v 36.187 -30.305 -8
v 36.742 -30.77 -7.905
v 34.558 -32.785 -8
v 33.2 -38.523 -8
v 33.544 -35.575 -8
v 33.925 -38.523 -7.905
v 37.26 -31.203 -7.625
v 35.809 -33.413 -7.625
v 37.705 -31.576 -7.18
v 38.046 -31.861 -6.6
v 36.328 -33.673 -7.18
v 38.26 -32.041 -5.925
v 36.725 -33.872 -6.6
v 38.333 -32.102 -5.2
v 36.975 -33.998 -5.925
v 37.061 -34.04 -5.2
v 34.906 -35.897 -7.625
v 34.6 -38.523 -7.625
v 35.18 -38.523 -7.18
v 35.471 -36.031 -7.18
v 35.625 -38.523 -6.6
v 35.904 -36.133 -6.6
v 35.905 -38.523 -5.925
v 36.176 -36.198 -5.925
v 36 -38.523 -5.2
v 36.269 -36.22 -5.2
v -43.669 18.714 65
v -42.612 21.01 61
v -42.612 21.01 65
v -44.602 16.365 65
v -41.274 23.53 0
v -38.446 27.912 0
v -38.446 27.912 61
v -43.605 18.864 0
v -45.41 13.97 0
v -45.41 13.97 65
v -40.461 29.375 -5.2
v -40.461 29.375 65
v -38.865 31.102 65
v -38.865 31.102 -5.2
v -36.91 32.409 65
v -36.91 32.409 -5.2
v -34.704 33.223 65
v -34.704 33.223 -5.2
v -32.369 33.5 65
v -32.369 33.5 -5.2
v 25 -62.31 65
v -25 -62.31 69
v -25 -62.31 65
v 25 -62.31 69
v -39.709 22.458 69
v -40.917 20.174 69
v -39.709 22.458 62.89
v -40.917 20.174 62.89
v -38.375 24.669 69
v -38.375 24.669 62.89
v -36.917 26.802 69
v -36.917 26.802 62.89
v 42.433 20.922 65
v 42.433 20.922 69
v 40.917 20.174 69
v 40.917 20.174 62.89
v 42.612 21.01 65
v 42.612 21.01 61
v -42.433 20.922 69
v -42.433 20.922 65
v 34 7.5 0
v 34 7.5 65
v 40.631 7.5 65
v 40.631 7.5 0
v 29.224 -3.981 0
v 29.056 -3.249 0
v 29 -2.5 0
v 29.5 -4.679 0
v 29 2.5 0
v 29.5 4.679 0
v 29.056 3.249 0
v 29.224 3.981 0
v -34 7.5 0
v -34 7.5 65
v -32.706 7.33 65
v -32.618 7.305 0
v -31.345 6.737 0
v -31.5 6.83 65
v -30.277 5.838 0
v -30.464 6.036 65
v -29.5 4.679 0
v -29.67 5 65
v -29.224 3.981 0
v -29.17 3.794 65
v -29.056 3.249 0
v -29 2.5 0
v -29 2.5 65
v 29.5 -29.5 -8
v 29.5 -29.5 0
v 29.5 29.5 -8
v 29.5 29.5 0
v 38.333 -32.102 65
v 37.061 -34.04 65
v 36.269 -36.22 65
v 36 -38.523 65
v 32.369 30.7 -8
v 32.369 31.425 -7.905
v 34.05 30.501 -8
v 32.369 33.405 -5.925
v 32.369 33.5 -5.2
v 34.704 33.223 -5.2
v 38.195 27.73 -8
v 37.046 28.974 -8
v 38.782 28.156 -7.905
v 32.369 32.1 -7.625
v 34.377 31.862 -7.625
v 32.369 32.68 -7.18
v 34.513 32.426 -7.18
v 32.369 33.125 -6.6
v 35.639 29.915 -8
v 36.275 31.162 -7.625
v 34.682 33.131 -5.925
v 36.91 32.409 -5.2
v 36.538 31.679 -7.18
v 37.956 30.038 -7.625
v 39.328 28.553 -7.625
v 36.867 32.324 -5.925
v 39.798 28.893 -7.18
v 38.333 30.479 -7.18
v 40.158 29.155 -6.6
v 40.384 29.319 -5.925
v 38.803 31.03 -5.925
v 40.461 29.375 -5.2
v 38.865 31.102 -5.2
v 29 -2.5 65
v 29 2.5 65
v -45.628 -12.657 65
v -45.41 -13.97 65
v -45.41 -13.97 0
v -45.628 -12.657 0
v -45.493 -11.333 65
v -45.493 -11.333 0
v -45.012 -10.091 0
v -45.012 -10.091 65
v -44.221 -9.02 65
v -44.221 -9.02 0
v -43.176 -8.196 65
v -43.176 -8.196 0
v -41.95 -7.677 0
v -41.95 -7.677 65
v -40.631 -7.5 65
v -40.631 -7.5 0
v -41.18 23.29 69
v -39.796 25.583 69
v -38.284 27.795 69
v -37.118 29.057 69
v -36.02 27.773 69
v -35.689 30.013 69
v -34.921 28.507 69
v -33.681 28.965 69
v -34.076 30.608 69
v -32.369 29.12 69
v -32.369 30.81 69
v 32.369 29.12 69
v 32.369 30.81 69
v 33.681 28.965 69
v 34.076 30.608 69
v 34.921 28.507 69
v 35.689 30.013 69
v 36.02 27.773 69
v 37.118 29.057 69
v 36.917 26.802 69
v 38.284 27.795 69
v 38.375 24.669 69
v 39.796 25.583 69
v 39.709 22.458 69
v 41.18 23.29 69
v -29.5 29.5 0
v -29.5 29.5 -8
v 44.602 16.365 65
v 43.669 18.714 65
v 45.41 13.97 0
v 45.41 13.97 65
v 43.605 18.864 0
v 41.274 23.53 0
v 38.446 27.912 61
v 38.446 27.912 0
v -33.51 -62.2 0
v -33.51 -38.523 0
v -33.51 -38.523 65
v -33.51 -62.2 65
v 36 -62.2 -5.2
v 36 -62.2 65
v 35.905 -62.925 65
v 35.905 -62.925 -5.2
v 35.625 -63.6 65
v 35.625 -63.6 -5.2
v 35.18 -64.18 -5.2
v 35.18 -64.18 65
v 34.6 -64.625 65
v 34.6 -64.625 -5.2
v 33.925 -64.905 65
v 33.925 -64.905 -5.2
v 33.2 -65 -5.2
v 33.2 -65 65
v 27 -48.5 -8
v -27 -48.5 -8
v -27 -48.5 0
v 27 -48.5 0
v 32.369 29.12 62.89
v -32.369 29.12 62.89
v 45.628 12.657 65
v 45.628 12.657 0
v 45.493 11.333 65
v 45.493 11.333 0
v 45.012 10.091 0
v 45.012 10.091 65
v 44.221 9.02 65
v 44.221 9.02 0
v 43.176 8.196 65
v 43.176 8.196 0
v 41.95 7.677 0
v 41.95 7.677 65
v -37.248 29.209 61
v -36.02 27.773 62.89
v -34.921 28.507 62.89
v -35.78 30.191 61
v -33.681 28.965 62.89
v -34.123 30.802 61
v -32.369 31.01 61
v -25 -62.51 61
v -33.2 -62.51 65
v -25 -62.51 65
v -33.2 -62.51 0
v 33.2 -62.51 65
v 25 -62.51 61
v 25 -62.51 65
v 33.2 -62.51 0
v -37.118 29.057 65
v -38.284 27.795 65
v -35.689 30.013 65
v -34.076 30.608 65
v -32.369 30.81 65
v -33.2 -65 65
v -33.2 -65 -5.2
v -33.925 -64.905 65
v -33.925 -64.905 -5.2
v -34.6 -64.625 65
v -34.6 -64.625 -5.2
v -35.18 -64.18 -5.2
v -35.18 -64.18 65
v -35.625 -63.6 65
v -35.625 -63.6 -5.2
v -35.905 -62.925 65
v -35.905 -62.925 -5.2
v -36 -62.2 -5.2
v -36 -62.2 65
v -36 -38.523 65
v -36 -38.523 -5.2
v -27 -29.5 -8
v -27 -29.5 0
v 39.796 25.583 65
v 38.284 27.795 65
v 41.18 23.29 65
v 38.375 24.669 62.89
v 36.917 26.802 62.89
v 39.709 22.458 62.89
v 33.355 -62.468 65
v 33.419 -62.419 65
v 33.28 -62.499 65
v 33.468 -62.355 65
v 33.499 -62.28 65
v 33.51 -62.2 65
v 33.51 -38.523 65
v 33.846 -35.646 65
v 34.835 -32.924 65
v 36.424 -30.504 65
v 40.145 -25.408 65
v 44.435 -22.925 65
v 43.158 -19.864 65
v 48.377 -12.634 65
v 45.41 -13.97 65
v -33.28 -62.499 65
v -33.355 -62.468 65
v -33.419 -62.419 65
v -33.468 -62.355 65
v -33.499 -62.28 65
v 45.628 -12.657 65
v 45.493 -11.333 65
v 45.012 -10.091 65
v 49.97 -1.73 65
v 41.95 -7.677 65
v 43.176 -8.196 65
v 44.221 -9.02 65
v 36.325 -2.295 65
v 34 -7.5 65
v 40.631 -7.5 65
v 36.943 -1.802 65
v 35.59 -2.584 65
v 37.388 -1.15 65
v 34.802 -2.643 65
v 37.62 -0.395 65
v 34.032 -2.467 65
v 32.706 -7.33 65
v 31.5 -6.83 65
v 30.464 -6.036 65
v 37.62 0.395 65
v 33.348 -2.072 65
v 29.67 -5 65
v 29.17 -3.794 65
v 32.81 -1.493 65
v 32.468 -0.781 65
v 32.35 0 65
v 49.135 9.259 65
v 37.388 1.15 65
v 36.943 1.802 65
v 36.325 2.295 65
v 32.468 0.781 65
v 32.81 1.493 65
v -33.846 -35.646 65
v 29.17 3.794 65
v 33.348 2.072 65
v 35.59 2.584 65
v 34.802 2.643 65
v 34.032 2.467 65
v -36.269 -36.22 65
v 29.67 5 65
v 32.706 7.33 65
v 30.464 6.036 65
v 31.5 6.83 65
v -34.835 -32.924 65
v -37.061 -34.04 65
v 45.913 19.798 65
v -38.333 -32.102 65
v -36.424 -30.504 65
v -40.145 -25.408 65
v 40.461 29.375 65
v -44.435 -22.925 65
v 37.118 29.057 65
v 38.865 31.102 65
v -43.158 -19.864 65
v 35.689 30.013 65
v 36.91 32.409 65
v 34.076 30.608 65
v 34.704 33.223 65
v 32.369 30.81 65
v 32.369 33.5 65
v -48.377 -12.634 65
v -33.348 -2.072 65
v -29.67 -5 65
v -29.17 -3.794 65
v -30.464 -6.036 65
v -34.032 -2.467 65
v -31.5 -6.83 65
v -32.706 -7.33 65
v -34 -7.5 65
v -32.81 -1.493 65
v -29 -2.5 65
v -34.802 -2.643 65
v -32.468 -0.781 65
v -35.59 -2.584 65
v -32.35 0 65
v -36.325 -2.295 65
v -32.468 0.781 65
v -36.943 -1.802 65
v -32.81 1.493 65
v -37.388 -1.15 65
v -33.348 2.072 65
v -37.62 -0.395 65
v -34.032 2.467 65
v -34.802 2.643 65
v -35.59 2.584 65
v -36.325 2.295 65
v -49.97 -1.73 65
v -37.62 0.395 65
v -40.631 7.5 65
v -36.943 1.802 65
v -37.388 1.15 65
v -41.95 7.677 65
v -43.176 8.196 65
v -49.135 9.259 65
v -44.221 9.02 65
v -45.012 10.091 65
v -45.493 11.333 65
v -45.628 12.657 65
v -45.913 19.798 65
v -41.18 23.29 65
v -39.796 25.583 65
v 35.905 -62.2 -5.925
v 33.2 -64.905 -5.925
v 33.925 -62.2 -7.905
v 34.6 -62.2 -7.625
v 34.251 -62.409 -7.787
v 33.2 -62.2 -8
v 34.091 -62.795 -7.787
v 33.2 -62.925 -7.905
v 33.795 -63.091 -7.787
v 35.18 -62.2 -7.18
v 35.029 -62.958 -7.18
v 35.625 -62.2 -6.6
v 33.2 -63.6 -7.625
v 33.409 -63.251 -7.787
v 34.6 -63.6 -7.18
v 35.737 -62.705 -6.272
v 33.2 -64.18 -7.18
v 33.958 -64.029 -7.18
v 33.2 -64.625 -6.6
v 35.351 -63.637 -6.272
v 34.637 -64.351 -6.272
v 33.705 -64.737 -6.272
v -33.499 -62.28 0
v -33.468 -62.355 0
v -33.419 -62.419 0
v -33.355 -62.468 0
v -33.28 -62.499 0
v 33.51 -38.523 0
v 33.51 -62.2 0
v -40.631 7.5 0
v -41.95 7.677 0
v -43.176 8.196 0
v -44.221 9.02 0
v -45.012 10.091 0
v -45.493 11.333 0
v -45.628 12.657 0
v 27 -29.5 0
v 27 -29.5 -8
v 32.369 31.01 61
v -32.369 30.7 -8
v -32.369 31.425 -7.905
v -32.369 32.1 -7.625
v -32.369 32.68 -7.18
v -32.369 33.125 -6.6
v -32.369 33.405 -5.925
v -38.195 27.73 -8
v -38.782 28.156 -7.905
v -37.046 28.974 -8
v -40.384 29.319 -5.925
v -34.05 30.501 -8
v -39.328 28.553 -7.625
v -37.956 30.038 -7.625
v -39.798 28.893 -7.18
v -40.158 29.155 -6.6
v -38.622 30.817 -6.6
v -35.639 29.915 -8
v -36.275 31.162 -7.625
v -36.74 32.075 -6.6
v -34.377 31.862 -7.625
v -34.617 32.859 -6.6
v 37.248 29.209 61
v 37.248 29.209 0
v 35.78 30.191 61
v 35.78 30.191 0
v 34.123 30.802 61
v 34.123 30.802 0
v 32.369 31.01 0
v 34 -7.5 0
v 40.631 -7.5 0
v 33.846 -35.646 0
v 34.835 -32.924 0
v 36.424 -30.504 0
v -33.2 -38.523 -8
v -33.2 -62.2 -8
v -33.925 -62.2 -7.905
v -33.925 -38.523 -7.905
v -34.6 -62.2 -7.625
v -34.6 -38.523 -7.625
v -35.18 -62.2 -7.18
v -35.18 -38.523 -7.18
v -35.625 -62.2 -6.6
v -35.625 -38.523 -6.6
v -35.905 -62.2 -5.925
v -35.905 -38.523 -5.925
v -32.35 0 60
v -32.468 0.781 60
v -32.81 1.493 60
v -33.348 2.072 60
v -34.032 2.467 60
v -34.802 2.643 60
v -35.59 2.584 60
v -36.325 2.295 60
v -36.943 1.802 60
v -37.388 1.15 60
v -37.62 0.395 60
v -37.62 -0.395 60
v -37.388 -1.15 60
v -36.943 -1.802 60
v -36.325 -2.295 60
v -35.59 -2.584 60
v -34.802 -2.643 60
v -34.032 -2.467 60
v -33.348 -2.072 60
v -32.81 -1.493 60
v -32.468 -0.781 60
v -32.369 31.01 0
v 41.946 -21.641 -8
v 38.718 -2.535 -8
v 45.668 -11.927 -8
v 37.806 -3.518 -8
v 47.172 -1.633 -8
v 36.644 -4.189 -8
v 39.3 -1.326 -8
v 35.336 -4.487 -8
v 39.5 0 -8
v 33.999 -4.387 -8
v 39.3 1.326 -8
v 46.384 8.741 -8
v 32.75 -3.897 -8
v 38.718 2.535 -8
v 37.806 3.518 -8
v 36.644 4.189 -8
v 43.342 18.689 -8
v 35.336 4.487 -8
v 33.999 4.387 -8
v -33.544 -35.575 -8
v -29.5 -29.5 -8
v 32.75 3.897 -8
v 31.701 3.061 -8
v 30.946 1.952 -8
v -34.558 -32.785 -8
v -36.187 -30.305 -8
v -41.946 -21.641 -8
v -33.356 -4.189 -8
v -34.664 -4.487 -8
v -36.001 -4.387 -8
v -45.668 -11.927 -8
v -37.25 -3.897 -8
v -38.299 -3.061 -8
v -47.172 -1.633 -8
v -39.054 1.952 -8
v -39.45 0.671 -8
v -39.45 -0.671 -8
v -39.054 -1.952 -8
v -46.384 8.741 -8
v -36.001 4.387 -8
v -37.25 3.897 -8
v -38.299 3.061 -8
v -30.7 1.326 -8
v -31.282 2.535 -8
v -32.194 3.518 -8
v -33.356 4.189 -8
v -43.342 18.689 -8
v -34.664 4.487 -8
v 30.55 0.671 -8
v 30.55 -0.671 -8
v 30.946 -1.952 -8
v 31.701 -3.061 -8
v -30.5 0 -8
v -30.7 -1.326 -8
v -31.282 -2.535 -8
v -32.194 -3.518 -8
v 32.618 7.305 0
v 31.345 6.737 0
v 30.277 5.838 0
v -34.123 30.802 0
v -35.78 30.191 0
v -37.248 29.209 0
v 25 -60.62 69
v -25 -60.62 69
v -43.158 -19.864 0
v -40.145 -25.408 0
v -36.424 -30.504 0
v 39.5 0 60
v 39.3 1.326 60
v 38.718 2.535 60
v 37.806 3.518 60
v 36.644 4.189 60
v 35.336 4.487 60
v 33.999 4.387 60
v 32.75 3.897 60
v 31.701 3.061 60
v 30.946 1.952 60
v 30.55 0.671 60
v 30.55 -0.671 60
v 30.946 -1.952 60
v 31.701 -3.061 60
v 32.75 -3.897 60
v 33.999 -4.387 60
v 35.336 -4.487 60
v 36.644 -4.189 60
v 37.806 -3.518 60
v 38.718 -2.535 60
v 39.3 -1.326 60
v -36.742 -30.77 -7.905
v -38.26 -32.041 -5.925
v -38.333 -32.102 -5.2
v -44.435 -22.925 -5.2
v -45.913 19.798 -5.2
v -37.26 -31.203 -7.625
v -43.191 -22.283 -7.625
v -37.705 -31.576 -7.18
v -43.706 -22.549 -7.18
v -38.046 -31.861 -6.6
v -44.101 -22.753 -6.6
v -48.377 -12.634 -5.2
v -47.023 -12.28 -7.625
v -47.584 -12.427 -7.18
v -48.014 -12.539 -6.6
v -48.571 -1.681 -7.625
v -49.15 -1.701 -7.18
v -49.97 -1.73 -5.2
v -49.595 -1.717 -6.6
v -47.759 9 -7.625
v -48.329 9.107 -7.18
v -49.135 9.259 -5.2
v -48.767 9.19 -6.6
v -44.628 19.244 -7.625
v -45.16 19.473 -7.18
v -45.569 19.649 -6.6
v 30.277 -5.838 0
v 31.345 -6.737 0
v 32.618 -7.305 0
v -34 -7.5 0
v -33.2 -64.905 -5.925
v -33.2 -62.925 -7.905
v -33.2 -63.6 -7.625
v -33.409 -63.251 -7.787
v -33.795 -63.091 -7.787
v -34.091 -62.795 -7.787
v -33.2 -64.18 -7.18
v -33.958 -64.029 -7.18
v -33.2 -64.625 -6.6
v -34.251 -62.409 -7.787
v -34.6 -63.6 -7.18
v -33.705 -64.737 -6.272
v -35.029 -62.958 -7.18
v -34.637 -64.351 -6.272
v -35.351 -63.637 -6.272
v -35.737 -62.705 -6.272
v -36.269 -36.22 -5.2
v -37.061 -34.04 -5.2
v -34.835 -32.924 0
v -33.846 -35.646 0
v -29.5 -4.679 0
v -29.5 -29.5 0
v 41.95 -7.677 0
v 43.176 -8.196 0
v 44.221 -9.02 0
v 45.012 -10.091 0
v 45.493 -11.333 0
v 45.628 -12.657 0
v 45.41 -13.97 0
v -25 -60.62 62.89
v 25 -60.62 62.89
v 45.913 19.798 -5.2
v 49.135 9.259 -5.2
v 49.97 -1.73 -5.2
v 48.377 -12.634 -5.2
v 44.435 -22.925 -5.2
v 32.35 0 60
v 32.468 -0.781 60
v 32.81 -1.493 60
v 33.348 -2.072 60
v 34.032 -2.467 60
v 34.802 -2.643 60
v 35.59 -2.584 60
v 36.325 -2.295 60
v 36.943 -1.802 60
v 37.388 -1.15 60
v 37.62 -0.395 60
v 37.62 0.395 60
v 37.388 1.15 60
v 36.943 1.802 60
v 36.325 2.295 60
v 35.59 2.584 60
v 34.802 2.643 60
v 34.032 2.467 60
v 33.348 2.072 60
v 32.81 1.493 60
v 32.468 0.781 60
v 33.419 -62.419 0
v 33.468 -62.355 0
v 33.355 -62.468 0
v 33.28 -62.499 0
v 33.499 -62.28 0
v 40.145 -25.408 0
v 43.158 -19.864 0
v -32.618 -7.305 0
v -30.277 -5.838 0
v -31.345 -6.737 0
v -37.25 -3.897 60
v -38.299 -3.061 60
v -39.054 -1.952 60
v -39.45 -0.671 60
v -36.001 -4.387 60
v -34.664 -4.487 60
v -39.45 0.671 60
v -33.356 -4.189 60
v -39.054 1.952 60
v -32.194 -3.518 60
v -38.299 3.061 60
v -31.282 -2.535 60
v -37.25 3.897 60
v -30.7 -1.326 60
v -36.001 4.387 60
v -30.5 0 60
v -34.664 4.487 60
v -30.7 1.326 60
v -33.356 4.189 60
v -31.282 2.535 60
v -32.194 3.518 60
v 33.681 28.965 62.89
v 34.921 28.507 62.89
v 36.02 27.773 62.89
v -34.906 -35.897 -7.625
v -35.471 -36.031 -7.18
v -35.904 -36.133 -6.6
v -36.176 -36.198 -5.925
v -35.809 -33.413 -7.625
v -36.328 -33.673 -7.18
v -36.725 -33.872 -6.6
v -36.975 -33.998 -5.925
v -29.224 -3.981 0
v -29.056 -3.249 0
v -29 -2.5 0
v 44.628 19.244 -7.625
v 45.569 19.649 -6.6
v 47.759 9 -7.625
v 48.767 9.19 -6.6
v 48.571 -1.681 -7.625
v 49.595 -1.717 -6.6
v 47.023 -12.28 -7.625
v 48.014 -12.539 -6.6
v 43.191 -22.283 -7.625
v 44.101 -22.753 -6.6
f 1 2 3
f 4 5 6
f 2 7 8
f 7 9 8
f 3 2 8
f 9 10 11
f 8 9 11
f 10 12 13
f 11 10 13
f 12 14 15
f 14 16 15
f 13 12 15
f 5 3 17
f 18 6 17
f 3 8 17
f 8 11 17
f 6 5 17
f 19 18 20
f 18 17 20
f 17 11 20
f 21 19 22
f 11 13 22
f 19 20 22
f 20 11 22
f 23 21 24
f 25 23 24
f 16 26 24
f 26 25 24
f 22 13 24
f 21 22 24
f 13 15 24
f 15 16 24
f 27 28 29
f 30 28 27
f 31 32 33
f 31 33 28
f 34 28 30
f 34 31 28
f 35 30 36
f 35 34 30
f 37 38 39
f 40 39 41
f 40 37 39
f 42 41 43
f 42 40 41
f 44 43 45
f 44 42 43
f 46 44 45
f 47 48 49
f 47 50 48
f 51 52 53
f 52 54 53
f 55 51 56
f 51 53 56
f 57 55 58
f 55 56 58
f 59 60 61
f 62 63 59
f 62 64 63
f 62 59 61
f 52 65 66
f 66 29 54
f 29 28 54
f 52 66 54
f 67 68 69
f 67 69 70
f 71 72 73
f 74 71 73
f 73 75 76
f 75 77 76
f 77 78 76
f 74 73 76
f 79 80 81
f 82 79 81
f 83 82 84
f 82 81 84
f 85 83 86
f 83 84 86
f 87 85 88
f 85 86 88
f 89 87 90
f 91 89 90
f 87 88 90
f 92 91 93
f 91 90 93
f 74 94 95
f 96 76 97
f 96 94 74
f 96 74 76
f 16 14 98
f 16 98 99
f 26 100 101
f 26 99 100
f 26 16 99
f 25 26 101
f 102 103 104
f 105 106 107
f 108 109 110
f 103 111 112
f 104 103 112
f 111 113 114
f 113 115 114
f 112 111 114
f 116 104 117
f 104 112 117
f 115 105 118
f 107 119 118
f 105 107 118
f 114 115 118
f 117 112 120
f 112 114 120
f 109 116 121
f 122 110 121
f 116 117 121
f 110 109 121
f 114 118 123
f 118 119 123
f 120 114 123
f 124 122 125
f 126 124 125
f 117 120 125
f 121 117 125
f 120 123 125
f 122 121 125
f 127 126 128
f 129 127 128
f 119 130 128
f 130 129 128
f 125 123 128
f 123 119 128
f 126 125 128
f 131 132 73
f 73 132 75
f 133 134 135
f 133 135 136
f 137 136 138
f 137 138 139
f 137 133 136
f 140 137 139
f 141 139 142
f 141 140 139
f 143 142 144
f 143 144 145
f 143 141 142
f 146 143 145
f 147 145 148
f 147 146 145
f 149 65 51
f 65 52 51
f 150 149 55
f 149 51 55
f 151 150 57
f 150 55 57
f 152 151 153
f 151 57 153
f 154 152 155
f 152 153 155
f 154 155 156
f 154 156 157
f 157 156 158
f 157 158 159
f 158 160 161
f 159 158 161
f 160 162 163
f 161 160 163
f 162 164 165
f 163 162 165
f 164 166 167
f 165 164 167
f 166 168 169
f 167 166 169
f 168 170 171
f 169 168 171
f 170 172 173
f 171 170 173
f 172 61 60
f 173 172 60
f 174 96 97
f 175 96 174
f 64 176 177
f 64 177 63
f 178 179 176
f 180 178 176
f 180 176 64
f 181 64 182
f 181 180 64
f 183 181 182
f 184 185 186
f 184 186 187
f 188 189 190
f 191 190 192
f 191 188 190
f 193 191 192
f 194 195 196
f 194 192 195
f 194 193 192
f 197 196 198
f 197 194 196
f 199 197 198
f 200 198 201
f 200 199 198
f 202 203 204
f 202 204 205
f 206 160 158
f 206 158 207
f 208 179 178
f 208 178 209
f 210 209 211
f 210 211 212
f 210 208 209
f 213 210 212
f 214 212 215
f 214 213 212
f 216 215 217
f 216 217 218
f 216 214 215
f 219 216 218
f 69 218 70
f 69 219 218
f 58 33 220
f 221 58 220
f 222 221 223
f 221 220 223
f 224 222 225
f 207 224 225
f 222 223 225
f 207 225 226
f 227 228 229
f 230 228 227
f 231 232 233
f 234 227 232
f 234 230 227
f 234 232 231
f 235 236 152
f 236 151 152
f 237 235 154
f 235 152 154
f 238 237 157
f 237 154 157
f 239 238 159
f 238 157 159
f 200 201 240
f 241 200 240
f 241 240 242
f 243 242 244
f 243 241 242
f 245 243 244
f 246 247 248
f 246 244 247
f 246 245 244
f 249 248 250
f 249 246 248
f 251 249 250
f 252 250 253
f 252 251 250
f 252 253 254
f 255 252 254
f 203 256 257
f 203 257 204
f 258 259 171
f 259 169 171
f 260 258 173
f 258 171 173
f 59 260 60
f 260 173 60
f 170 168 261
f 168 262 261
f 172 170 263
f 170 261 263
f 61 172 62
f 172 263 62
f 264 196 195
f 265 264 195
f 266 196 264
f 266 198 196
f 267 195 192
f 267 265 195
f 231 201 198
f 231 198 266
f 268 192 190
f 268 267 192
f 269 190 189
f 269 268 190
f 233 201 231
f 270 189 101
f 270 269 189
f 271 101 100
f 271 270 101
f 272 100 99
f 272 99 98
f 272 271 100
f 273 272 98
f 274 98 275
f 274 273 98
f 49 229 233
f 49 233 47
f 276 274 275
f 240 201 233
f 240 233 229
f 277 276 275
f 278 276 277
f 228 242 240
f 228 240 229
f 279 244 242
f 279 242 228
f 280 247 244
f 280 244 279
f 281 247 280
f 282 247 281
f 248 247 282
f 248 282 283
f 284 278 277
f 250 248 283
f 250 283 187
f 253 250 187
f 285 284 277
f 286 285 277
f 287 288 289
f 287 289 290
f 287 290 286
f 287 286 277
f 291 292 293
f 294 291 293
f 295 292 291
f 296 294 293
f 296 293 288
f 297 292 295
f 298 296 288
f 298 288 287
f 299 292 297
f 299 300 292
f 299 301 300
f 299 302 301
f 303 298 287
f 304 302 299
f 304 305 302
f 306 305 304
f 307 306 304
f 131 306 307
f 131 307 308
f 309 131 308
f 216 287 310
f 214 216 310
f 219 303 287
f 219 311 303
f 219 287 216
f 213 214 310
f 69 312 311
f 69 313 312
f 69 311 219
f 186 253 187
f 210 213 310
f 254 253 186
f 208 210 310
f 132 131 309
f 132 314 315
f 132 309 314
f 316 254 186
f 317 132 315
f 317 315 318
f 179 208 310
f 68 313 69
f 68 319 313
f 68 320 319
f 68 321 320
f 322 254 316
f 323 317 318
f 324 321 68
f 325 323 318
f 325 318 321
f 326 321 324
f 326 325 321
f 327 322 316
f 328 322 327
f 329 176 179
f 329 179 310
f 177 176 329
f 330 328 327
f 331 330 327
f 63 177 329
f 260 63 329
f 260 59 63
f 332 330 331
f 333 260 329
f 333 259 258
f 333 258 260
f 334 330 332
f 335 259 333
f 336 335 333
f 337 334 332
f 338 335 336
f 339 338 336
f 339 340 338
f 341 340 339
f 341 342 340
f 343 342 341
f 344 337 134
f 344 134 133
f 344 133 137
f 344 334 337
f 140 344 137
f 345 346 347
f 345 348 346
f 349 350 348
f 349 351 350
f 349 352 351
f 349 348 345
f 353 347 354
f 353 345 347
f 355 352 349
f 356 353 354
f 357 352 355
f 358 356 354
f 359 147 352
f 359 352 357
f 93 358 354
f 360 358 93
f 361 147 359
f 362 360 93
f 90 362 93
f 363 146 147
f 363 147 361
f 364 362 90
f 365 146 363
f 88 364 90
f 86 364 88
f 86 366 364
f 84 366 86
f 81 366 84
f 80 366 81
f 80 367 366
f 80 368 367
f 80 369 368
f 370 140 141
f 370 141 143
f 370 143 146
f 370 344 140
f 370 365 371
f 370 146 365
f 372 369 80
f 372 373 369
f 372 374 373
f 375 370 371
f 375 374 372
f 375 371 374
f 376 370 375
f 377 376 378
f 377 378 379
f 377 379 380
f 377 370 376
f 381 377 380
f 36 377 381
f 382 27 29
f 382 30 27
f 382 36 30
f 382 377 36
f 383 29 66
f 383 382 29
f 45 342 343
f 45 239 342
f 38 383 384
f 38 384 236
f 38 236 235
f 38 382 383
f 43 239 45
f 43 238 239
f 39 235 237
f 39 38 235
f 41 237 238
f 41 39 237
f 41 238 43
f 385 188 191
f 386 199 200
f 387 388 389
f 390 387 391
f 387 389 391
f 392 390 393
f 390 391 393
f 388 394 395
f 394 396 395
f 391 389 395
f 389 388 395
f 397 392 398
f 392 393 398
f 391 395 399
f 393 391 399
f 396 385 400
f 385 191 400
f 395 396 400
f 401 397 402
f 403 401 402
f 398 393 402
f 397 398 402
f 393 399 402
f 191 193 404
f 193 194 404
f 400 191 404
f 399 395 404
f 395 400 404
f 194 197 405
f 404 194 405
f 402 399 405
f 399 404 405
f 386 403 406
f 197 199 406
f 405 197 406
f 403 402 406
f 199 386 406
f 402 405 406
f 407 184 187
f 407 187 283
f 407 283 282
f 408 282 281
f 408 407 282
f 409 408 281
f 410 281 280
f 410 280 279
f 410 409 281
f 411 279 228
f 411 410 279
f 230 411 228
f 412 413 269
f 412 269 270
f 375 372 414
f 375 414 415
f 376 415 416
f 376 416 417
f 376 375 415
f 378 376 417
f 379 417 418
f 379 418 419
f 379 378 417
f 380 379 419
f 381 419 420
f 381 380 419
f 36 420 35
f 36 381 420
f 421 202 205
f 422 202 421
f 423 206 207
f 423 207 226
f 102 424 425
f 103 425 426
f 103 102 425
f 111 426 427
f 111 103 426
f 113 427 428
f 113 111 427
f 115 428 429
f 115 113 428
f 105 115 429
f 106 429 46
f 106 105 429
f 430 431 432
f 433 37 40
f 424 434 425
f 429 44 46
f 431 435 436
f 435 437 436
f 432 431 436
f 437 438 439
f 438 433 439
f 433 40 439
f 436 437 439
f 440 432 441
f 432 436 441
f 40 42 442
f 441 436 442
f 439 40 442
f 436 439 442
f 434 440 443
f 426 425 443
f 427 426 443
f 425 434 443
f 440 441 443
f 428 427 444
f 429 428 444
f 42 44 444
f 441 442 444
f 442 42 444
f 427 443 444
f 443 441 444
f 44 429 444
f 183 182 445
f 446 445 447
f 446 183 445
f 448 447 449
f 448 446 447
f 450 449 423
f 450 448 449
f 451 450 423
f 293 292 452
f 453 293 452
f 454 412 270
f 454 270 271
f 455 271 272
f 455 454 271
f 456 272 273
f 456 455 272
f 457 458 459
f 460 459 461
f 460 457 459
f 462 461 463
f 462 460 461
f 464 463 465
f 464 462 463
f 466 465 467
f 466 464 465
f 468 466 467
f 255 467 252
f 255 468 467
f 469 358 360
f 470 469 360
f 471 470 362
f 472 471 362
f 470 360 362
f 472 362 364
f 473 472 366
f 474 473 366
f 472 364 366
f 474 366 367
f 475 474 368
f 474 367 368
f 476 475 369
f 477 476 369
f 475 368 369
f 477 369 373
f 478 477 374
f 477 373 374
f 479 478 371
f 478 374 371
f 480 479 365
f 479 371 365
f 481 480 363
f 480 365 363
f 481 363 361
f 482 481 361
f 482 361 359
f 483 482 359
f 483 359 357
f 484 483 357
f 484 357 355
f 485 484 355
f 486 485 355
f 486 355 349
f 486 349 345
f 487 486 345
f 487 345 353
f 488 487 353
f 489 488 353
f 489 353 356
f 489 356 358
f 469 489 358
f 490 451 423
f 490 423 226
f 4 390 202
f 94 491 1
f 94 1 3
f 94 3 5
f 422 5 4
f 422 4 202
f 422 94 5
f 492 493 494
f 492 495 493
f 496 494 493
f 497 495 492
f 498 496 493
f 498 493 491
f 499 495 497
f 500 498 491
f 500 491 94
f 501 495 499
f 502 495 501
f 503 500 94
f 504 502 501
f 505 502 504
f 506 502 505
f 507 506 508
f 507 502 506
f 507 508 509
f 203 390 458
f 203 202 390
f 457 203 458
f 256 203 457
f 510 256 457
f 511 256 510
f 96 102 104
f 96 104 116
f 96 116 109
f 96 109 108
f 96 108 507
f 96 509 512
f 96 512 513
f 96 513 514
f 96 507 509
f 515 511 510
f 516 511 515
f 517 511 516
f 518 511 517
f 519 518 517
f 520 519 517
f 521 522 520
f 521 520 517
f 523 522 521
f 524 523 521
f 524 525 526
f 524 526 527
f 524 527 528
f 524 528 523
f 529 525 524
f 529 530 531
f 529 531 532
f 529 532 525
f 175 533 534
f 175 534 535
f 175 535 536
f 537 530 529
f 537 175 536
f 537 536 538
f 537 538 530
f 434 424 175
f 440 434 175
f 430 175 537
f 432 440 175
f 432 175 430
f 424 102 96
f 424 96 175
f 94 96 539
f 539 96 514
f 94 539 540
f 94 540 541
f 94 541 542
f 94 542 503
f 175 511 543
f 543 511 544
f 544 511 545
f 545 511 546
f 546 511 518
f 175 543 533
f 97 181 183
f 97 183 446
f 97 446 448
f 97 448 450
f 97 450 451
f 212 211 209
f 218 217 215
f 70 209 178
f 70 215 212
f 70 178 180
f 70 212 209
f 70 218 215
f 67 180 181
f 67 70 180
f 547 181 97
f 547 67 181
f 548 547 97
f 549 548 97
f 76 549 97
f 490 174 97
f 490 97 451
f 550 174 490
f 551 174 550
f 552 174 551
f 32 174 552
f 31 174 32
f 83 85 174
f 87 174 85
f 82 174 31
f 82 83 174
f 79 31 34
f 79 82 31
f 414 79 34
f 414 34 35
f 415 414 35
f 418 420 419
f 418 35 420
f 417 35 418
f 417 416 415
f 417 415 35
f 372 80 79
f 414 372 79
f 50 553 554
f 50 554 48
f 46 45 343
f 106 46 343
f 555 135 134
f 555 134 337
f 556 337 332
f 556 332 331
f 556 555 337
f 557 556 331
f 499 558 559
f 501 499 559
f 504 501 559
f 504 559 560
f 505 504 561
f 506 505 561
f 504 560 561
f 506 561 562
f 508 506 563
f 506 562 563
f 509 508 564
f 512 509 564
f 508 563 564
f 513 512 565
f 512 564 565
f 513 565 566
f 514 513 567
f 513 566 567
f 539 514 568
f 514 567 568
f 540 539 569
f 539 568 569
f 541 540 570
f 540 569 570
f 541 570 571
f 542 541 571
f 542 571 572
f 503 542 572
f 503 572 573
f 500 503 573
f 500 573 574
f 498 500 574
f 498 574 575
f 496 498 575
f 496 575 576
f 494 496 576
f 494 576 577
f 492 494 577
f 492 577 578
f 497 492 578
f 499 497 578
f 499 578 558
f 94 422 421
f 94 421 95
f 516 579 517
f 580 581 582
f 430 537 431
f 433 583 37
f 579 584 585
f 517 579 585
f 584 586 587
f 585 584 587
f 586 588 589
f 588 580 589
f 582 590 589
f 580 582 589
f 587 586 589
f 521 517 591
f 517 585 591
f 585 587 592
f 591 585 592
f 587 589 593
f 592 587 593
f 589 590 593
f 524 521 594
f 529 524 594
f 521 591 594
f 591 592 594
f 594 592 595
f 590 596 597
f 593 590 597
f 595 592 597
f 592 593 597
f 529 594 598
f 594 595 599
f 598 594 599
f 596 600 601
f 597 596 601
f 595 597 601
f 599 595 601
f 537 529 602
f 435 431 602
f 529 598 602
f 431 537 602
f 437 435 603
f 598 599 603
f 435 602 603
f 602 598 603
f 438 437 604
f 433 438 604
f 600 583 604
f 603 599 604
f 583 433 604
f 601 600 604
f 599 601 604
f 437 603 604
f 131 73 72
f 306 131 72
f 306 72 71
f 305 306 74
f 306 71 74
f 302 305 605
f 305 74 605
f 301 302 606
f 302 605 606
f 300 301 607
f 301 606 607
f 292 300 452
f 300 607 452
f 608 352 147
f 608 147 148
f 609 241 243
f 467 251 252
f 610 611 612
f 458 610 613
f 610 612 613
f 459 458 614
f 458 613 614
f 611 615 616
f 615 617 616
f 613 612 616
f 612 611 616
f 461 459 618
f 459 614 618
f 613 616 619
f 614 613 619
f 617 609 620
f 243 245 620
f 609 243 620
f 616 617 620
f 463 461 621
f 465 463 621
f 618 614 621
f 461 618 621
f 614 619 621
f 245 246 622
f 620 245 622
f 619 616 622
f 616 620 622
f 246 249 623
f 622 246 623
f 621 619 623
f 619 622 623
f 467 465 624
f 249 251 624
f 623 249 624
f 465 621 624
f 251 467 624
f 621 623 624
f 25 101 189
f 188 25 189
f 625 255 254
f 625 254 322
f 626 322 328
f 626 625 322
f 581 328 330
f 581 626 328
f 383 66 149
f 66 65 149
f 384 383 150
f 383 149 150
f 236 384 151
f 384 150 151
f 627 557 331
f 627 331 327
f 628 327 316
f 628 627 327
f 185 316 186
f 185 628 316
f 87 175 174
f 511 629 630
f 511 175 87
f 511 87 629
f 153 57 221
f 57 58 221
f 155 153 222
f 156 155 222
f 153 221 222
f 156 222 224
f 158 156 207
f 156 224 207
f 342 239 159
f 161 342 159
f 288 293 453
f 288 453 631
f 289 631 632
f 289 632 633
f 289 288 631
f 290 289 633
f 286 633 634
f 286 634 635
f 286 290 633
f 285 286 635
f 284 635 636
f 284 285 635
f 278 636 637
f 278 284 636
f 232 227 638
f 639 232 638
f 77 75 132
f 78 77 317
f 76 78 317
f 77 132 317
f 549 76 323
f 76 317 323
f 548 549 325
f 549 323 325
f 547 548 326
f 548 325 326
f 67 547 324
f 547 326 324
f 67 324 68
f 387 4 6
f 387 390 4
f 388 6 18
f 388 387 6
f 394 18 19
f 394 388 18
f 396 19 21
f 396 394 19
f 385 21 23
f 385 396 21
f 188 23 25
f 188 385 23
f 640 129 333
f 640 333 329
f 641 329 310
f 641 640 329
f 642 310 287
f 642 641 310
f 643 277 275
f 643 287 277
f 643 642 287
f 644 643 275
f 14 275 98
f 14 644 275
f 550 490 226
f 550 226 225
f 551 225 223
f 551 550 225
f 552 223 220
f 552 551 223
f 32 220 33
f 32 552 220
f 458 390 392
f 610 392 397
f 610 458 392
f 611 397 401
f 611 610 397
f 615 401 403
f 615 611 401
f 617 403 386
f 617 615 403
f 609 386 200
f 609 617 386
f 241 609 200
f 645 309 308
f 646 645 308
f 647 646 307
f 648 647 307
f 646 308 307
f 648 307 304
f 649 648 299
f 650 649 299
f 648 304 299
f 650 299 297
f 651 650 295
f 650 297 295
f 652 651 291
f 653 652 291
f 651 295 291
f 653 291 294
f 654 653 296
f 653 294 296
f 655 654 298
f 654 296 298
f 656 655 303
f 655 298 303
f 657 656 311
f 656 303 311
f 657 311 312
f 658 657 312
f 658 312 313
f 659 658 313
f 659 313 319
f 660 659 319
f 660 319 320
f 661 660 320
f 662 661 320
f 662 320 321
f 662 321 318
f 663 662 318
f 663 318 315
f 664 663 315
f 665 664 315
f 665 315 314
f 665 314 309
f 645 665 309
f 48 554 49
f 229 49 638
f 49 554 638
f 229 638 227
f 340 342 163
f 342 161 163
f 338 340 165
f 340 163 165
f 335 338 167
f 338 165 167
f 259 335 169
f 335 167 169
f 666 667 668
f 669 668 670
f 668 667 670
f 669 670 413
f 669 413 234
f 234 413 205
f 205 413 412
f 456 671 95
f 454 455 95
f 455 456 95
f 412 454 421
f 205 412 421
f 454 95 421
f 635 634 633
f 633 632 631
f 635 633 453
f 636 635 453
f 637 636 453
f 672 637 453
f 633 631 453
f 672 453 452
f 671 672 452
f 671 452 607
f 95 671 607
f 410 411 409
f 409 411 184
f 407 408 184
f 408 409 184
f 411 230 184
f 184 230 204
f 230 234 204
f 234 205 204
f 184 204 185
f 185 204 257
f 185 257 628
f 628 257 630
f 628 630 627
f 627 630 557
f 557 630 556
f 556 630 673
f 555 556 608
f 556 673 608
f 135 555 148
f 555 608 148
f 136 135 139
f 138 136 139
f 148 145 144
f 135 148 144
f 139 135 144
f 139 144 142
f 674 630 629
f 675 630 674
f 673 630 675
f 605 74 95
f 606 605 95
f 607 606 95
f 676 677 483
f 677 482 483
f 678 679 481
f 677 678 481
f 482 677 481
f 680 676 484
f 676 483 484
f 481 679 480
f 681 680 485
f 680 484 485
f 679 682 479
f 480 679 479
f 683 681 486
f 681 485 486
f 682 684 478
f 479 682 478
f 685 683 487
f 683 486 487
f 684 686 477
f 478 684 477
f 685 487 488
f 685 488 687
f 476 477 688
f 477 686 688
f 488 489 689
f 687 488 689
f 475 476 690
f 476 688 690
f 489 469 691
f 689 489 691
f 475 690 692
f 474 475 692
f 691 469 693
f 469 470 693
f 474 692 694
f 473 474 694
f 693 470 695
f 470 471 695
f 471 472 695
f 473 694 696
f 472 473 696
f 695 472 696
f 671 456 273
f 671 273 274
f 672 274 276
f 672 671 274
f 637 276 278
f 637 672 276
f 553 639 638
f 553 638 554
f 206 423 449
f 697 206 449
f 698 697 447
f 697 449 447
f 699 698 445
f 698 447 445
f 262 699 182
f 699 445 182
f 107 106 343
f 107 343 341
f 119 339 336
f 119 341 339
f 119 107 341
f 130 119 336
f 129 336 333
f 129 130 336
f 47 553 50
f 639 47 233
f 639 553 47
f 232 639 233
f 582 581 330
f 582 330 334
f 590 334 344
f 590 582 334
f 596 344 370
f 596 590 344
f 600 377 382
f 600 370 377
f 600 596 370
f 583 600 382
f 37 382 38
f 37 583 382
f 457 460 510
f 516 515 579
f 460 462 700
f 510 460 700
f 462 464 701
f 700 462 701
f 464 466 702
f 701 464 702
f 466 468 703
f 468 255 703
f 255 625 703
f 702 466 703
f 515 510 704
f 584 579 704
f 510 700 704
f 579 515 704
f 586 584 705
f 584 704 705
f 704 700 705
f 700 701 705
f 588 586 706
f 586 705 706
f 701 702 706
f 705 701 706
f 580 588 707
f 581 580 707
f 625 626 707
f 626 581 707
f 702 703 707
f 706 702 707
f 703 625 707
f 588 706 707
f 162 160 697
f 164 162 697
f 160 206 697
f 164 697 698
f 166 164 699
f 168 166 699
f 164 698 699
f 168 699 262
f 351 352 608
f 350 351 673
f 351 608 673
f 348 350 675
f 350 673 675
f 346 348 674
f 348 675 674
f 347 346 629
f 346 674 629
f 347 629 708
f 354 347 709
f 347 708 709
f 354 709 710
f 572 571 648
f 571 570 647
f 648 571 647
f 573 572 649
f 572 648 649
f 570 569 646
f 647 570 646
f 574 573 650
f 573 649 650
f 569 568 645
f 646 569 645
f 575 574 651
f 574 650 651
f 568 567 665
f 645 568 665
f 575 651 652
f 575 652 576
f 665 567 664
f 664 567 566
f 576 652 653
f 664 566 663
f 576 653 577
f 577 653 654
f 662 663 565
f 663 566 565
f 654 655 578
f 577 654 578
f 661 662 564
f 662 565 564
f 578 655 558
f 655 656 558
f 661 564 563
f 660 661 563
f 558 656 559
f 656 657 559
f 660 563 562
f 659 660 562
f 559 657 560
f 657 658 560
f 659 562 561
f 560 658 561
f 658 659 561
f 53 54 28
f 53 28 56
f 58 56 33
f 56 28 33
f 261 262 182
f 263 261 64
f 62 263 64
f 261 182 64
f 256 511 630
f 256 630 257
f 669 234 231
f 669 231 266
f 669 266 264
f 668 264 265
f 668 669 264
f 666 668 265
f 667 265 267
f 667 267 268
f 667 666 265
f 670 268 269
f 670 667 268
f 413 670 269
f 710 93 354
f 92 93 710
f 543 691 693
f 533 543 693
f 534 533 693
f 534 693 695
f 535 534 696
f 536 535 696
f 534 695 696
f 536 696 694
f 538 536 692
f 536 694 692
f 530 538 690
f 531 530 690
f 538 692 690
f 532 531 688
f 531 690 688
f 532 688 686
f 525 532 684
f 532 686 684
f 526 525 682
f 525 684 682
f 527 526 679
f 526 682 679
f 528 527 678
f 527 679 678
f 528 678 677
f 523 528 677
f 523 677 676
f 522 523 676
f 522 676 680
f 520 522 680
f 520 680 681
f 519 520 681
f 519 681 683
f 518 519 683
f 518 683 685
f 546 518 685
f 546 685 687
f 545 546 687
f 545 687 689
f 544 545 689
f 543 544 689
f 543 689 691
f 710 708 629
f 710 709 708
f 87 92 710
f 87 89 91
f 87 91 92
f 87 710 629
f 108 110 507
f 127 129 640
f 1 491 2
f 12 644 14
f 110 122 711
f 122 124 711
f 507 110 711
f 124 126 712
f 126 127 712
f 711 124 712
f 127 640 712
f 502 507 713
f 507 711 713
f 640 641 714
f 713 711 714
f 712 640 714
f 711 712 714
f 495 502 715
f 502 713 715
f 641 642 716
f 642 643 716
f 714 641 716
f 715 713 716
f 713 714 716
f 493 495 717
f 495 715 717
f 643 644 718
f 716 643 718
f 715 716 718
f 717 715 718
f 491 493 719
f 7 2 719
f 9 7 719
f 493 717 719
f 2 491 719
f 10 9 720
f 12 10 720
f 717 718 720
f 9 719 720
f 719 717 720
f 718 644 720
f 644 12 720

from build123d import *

# Parameters (mm, degrees)
LINEAR_AUSTRAGEN_D_NN1_DEPTH         = 65
AUFSATZ_LINEAR_START                 = 8
AUFSATZ_LINEAR_AUSTRAGEN2_DEPTH      = 8
AUFSATZ_LINEAR_AUSTRAGEN3_REACH      = 135.642
AUFSATZ_LINEAR_AUSTRAGEN3_END_RADIUS = 47.51
AUFSATZ_LINEAR_START_2               = 29
SKIZZE6_W                            = 65
SKIZZE6_H                            = 15
AUFSATZ_LINEAR_AUSTRAGEN4_REACH      = 135.642
AUFSATZ_LINEAR_START_3               = -29
SKIZZE6_2_W                          = 65
SKIZZE6_2_H                          = 15
SCHNITT_LINEAR_AUSTRAGEN2_REACH      = 111.791
SKIZZE7_R                            = 2.65
SCHNITT_LINEAR_AUSTRAGEN3_REACH      = 116.791
SCHNITT_LINEAR_START                 = -5
SKIZZE8_R                            = 4.5
AUFSATZ_LINEAR_AUSTRAGEN6_DEPTH      = 25
VERRUNDUNG1_R                        = 5
VERRUNDUNG3_R                        = 2.8


with BuildPart() as part:
    # Skizze1 → Linear-Austragen-Dünn1 (new body)
    with BuildSketch(Plane.XY):
        with BuildLine():
            Line((-33.2, -65), (0, -65))
            Line((0, -65), (33.2, -65))
            ThreePointArc((33.2, -65), (35.179898987, -64.179898987), (36, -62.2))
            Line((36, -62.2), (36, -38.522720569))
            ThreePointArc((36, -38.522720569), (36.601418547, -35.107070313), (38.333333333, -32.10226714))
            ThreePointArc((38.333333333, -32.10226714), (49.970076451, -1.729583607), (40.461208274, 29.375))
            ThreePointArc((40.461208274, 29.375), (36.91044215, 32.409264841), (32.368966619, 33.5))
            Line((32.368966619, 33.5), (0, 33.5))
            Line((0, 33.5), (-32.368966619, 33.5))
            ThreePointArc((-32.368966619, 33.5), (-36.91044215, 32.409264841), (-40.461208274, 29.375))
            ThreePointArc((-40.461208274, 29.375), (-49.970076451, -1.729583607), (-38.333333333, -32.10226714))
            ThreePointArc((-38.333333333, -32.10226714), (-36.601418547, -35.107070313), (-36, -38.522720569))
            Line((-36, -38.522720569), (-36, -62.2))
            ThreePointArc((-36, -62.2), (-35.179898987, -64.179898987), (-33.2, -65))
        make_face()
        with BuildLine():
            Line((-33.2, -62.51), (0, -62.51))
            Line((0, -62.51), (33.2, -62.51))
            ThreePointArc((33.2, -62.51), (33.419203102, -62.419203102), (33.51, -62.2))
            Line((33.51, -62.2), (33.51, -38.522720569))
            ThreePointArc((33.51, -38.522720569), (34.261171765, -34.2565734), (36.424333333, -30.503574237))
            ThreePointArc((36.424333333, -30.503574237), (47.481566644, -1.643450344), (38.446240102, 27.912125))
            ThreePointArc((38.446240102, 27.912125), (35.779614743, 30.190857895), (32.368966619, 31.01))
            Line((32.368966619, 31.01), (0, 31.01))
            Line((0, 31.01), (-32.368966619, 31.01))
            ThreePointArc((-32.368966619, 31.01), (-35.779614743, 30.190857895), (-38.446240102, 27.912125))
            ThreePointArc((-38.446240102, 27.912125), (-47.481566644, -1.643450344), (-36.424333333, -30.503574237))
            ThreePointArc((-36.424333333, -30.503574237), (-34.261171765, -34.2565734), (-33.51, -38.522720569))
            Line((-33.51, -38.522720569), (-33.51, -62.2))
            ThreePointArc((-33.51, -62.2), (-33.419203102, -62.419203102), (-33.2, -62.51))
        make_face(mode=Mode.SUBTRACT)
    extrude(amount=LINEAR_AUSTRAGEN_D_NN1_DEPTH)

    # Skizze3 → Aufsatz-Linear austragen2 (add)
    # profile 1 of 2: a face of its own
    with BuildSketch(Plane(origin=(0, 0, 0), x_dir=(-1, 0, 0), z_dir=(0, 0, -1)).offset(AUFSATZ_LINEAR_START)):
        with BuildLine():
            ThreePointArc((40.461208274, 29.375), (36.91044215, 32.409264841), (32.368966619, 33.5))
            Line((32.368966619, 33.5), (-32.368966619, 33.5))
            ThreePointArc((-32.368966619, 33.5), (-36.91044215, 32.409264841), (-40.461208274, 29.375))
            ThreePointArc((-40.461208274, 29.375), (-49.970076451, -1.729583607), (-38.333333333, -32.10226714))
            ThreePointArc((-38.333333333, -32.10226714), (-36.601418547, -35.107070313), (-36, -38.522720569))
            Line((-36, -38.522720569), (-36, -62.2))
            ThreePointArc((-36, -62.2), (-35.179898987, -64.179898987), (-33.2, -65))
            Line((-33.2, -65), (33.2, -65))
            ThreePointArc((33.2, -65), (35.179898987, -64.179898987), (36, -62.2))
            Line((36, -62.2), (36, -38.522720569))
            ThreePointArc((36, -38.522720569), (36.601418547, -35.107070313), (38.333333333, -32.10226714))
            ThreePointArc((38.333333333, -32.10226714), (49.970076451, -1.729583607), (40.461208274, 29.375))
        make_face()
        with BuildLine():
            ThreePointArc((-38.446240102, 27.912125), (-35.779614743, 30.190857895), (-32.368966619, 31.01))
            Line((-32.368966619, 31.01), (32.368966619, 31.01))
            ThreePointArc((32.368966619, 31.01), (35.779614743, 30.190857895), (38.446240102, 27.912125))
            ThreePointArc((38.446240102, 27.912125), (47.481566644, -1.643450344), (36.424333333, -30.503574237))
            ThreePointArc((36.424333333, -30.503574237), (34.261171765, -34.2565734), (33.51, -38.522720569))
            Line((33.51, -38.522720569), (33.51, -62.2))
            ThreePointArc((33.51, -62.2), (33.419203102, -62.419203102), (33.2, -62.51))
            Line((33.2, -62.51), (-33.2, -62.51))
            ThreePointArc((-33.2, -62.51), (-33.419203102, -62.419203102), (-33.51, -62.2))
            Line((-33.51, -62.2), (-33.51, -38.522720569))
            ThreePointArc((-33.51, -38.522720569), (-34.261171765, -34.2565734), (-36.424333333, -30.503574237))
            ThreePointArc((-36.424333333, -30.503574237), (-47.481566644, -1.643450344), (-38.446240102, 27.912125))
        make_face(mode=Mode.SUBTRACT)
    # profile 2 of 2: a face of its own
    with BuildSketch(Plane(origin=(0, 0, 0), x_dir=(-1, 0, 0), z_dir=(0, 0, -1)).offset(AUFSATZ_LINEAR_START)):
        with BuildLine():
            Line((32.368966619, 31.01), (-32.368966619, 31.01))
            ThreePointArc((-32.368966619, 31.01), (-35.779614743, 30.190857895), (-38.446240102, 27.912125))
            ThreePointArc((-38.446240102, 27.912125), (-47.481566644, -1.643450344), (-36.424333333, -30.503574237))
            ThreePointArc((-36.424333333, -30.503574237), (-34.261171765, -34.2565734), (-33.51, -38.522720569))
            Line((-33.51, -38.522720569), (-33.51, -62.2))
            ThreePointArc((-33.51, -62.2), (-33.419203102, -62.419203102), (-33.2, -62.51))
            Line((-33.2, -62.51), (33.2, -62.51))
            ThreePointArc((33.2, -62.51), (33.419203102, -62.419203102), (33.51, -62.2))
            Line((33.51, -62.2), (33.51, -38.522720569))
            ThreePointArc((33.51, -38.522720569), (34.261171765, -34.2565734), (36.424333333, -30.503574237))
            ThreePointArc((36.424333333, -30.503574237), (47.481566644, -1.643450344), (38.446240102, 27.912125))
            ThreePointArc((38.446240102, 27.912125), (35.779614743, 30.190857895), (32.368966619, 31.01))
        make_face()
        Polygon((-27, -29.5), (-29.5, -29.5), (-29.5, 29.5), (29.5, 29.5), (29.5, -29.5), (27, -29.5), (27, -48.5), (-27, -48.5), align=None, mode=Mode.SUBTRACT)
    extrude(amount=-AUFSATZ_LINEAR_AUSTRAGEN2_DEPTH)

    # Aufsatz-Linear austragen3: up to this cylinder (the profile starts inside it)
    aufsatz_linear_austragen3_end = Plane(origin=(0, 0, 32.5), z_dir=(0, 0, -1)) * Cylinder(AUFSATZ_LINEAR_AUSTRAGEN3_END_RADIUS, 367.304, mode=Mode.PRIVATE)
    # Skizze6 → Aufsatz-Linear austragen3 (add, up to the surface)
    with BuildSketch(Plane(origin=(0, 0, 0), x_dir=(0, 0, -1), z_dir=(1, 0, 0)).offset(AUFSATZ_LINEAR_START_2), mode=Mode.PRIVATE) as aufsatz_linear_austragen3_sk1:
        with Locations((-32.5, 0)):
            Rectangle(SKIZZE6_W, SKIZZE6_H)
    aufsatz_linear_austragen3_tool1 = extrude(aufsatz_linear_austragen3_sk1.sketch, amount=AUFSATZ_LINEAR_AUSTRAGEN3_REACH, mode=Mode.PRIVATE) & aufsatz_linear_austragen3_end
    add(aufsatz_linear_austragen3_tool1.solids().sort_by_distance((29, 0, 32.5))[0])

    # Skizze6<2> → Aufsatz-Linear austragen4 (add, up to next)
    with BuildSketch(Plane(origin=(0, 0, 0), x_dir=(0, 0, -1), z_dir=(1, 0, 0)).offset(AUFSATZ_LINEAR_START_3), mode=Mode.PRIVATE) as aufsatz_linear_austragen4_sk1:
        with Locations((-32.5, 0)):
            Rectangle(SKIZZE6_2_W, SKIZZE6_2_H)
    aufsatz_linear_austragen4_tool1 = extrude(aufsatz_linear_austragen4_sk1.sketch, amount=-AUFSATZ_LINEAR_AUSTRAGEN4_REACH, mode=Mode.PRIVATE) - part.part
    add(aufsatz_linear_austragen4_tool1.solids().sort_by_distance((-29, 0, 32.5))[0])

    # Skizze7 → Schnitt-Linear austragen2 (cut, up to next)
    with BuildSketch(Plane.XY.offset(65), mode=Mode.PRIVATE) as schnitt_linear_austragen2_sk1:
        with Locations((-35, 0)):
            Circle(SKIZZE7_R)
    schnitt_linear_austragen2_tool1 = extrude(schnitt_linear_austragen2_sk1.sketch, amount=-SCHNITT_LINEAR_AUSTRAGEN2_REACH, mode=Mode.PRIVATE) & part.part
    # Skizze7 → Schnitt-Linear austragen2 (cut, up to next)
    with BuildSketch(Plane.XY.offset(65), mode=Mode.PRIVATE) as schnitt_linear_austragen2_sk2:
        with Locations(Location((35, 0, 0), (0, 0, 180))):
            Circle(SKIZZE7_R)
    schnitt_linear_austragen2_tool2 = extrude(schnitt_linear_austragen2_sk2.sketch, amount=-SCHNITT_LINEAR_AUSTRAGEN2_REACH, mode=Mode.PRIVATE) & part.part
    add(schnitt_linear_austragen2_tool1.solids().sort_by_distance((-35, 0, 65))[0], mode=Mode.SUBTRACT)
    add(schnitt_linear_austragen2_tool2.solids().sort_by_distance((35, 0, 65))[0], mode=Mode.SUBTRACT)

    # Skizze8 → Schnitt-Linear austragen3 (cut, up to next)
    with BuildSketch(Plane.XY.offset(65).offset(SCHNITT_LINEAR_START), mode=Mode.PRIVATE) as schnitt_linear_austragen3_sk1:
        with Locations((-35, 0)):
            Circle(SKIZZE8_R)
    schnitt_linear_austragen3_tool1 = extrude(schnitt_linear_austragen3_sk1.sketch, amount=-SCHNITT_LINEAR_AUSTRAGEN3_REACH, mode=Mode.PRIVATE) & part.part
    # Skizze8 → Schnitt-Linear austragen3 (cut, up to next)
    with BuildSketch(Plane.XY.offset(65).offset(SCHNITT_LINEAR_START), mode=Mode.PRIVATE) as schnitt_linear_austragen3_sk2:
        with Locations((35, 0)):
            Circle(SKIZZE8_R)
    schnitt_linear_austragen3_tool2 = extrude(schnitt_linear_austragen3_sk2.sketch, amount=-SCHNITT_LINEAR_AUSTRAGEN3_REACH, mode=Mode.PRIVATE) & part.part
    add(schnitt_linear_austragen3_tool1.solids().sort_by_distance((-35, 0, 60))[0], mode=Mode.SUBTRACT)
    add(schnitt_linear_austragen3_tool2.solids().sort_by_distance((35, 0, 60))[0], mode=Mode.SUBTRACT)

    # Austragung12: sweep along a path in Skizze10
    with BuildLine(Plane.XY.offset(65)) as austragung12_path:
        ThreePointArc((-42.611970149, 21.01), (-40.675769134, 24.549580553), (-38.446240102, 27.912125))
        ThreePointArc((-38.446240102, 27.912125), (-35.779614743, 30.190857895), (-32.368966619, 31.01))
        Line((-32.368966619, 31.01), (32.368966619, 31.01))
        ThreePointArc((32.368966619, 31.01), (35.779614743, 30.190857895), (38.446240102, 27.912125))
        ThreePointArc((38.446240102, 27.912125), (40.675769134, 24.549580553), (42.611970149, 21.01))
    # Skizze9 → Austragung12 (sweep)
    with BuildSketch(Plane(origin=(0, 0, 0), x_dir=(0, 0, -1), z_dir=(1, 0, 0))):
        Polygon((-65, 31.01), (-65, 30.81), (-69, 30.81), (-69, 29.12), (-62.89, 29.12), (-60, 32.01), (-65, 32.01), align=None)
    sweep(path=austragung12_path.line)

    # Skizze9<4> → Aufsatz-Linear austragen6 (add, symmetric)
    with BuildSketch(Plane(origin=(0, 0, 0), x_dir=(0, 0, -1), z_dir=(1, 0, 0))):
        Polygon((-65, -63.51), (-60, -63.51), (-62.89, -60.62), (-69, -60.62), (-69, -62.31), (-65, -62.31), (-65, -62.51), align=None)
    extrude(amount=AUFSATZ_LINEAR_AUSTRAGEN6_DEPTH, both=True)

    # Verrundung1
    # the kernel refuses this fillet: 5 mm, written as the material it adds along each edge
    with BuildSketch(Plane(origin=(46.914284605, 7.5, 65), x_dir=(-1, 0, 0), z_dir=(0, 0, -1)), Plane(origin=(-46.914284605, -7.5, 65), x_dir=(1, 0, 0), z_dir=(0, 0, -1))) as verrundung1_piece_1:
        with BuildLine():
            CenterArc((6.283629922, 5), VERRUNDUNG1_R, 162.899512403, 107.100487597)
            ThreePointArc((1.504677359, 6.470242296), (0.639115665, 3.261451554), (0, 0))
            Line((0, 0), (6.283629922, 0))
        make_face()
    extrude(amount=65)
    with BuildSketch(Plane(origin=(46.914284605, -7.5, 65), x_dir=(-0.22650918867747508, -0.9740090284205132, 0), z_dir=(0, 0, -1)), Plane(origin=(-46.914284605, 7.5, 65), x_dir=(0.2265091886774727, 0.9740090284205137, 0), z_dir=(0, 0, -1))) as verrundung1_piece_2:
        with BuildLine():
            CenterArc((6.293345058, 4.987766332), VERRUNDUNG1_R, 166.908360234, 107.100487597)
            Line((1.423299915, 6.120312275), (0, 0))
            ThreePointArc((0, 0), (3.32144883, -0.116244318), (6.64289766, 0))
        make_face()
    extrude(amount=65)
    # the kernel refuses this fillet: 5 mm, written as the material it takes off along each edge
    with BuildSketch(Plane(origin=(29, 7.5, 77.5), x_dir=(1, 0, 0), z_dir=(0, 0, -1)), Plane(origin=(-29, 7.5, 77.5), x_dir=(0, -1, 0), z_dir=(0, 0, -1))) as verrundung1_2_piece_1:
        with BuildLine():
            CenterArc((VERRUNDUNG1_R, VERRUNDUNG1_R), VERRUNDUNG1_R, 180, 90)
            Line((0, VERRUNDUNG1_R), (0, 0))
            Line((0, 0), (VERRUNDUNG1_R, 0))
        make_face()
    extrude(amount=77.5, mode=Mode.SUBTRACT)
    with BuildSketch(Plane(origin=(29, -7.5, 0), x_dir=(0, 1, 0), z_dir=(0, 0, 1)), Plane(origin=(-29, -7.5, 0), x_dir=(-1, 0, 0), z_dir=(0, 0, 1))) as verrundung1_2_piece_2:
        with BuildLine():
            CenterArc((VERRUNDUNG1_R, -VERRUNDUNG1_R), VERRUNDUNG1_R, 90, 90)
            Line((0, -VERRUNDUNG1_R), (0, 0))
            Line((0, 0), (VERRUNDUNG1_R, 0))
        make_face()
    extrude(amount=77.5, mode=Mode.SUBTRACT)

    # Verrundung3
    verrundung3_edges = [part.edges().sort_by_distance(p)[0] for p in [
        (-36.91044215, 32.409264841, -8),
        (0, 33.5, -8),
        (36.91044215, 32.409264841, -8),
        (49.970076451, -1.729583607, -8),
        (36.601418547, -35.107070313, -8),
        (36, -50.361360284, -8),
        (35.179898987, -64.179898987, -8),
        (0, -65, -8),
        (-35.179898987, -64.179898987, -8),
        (-36, -50.361360284, -8),
        (-36.601418547, -35.107070313, -8),
        (-49.970076451, -1.729583607, -8),
    ]]
    fillet(verrundung3_edges, radius=VERRUNDUNG3_R)


solid = part.part
